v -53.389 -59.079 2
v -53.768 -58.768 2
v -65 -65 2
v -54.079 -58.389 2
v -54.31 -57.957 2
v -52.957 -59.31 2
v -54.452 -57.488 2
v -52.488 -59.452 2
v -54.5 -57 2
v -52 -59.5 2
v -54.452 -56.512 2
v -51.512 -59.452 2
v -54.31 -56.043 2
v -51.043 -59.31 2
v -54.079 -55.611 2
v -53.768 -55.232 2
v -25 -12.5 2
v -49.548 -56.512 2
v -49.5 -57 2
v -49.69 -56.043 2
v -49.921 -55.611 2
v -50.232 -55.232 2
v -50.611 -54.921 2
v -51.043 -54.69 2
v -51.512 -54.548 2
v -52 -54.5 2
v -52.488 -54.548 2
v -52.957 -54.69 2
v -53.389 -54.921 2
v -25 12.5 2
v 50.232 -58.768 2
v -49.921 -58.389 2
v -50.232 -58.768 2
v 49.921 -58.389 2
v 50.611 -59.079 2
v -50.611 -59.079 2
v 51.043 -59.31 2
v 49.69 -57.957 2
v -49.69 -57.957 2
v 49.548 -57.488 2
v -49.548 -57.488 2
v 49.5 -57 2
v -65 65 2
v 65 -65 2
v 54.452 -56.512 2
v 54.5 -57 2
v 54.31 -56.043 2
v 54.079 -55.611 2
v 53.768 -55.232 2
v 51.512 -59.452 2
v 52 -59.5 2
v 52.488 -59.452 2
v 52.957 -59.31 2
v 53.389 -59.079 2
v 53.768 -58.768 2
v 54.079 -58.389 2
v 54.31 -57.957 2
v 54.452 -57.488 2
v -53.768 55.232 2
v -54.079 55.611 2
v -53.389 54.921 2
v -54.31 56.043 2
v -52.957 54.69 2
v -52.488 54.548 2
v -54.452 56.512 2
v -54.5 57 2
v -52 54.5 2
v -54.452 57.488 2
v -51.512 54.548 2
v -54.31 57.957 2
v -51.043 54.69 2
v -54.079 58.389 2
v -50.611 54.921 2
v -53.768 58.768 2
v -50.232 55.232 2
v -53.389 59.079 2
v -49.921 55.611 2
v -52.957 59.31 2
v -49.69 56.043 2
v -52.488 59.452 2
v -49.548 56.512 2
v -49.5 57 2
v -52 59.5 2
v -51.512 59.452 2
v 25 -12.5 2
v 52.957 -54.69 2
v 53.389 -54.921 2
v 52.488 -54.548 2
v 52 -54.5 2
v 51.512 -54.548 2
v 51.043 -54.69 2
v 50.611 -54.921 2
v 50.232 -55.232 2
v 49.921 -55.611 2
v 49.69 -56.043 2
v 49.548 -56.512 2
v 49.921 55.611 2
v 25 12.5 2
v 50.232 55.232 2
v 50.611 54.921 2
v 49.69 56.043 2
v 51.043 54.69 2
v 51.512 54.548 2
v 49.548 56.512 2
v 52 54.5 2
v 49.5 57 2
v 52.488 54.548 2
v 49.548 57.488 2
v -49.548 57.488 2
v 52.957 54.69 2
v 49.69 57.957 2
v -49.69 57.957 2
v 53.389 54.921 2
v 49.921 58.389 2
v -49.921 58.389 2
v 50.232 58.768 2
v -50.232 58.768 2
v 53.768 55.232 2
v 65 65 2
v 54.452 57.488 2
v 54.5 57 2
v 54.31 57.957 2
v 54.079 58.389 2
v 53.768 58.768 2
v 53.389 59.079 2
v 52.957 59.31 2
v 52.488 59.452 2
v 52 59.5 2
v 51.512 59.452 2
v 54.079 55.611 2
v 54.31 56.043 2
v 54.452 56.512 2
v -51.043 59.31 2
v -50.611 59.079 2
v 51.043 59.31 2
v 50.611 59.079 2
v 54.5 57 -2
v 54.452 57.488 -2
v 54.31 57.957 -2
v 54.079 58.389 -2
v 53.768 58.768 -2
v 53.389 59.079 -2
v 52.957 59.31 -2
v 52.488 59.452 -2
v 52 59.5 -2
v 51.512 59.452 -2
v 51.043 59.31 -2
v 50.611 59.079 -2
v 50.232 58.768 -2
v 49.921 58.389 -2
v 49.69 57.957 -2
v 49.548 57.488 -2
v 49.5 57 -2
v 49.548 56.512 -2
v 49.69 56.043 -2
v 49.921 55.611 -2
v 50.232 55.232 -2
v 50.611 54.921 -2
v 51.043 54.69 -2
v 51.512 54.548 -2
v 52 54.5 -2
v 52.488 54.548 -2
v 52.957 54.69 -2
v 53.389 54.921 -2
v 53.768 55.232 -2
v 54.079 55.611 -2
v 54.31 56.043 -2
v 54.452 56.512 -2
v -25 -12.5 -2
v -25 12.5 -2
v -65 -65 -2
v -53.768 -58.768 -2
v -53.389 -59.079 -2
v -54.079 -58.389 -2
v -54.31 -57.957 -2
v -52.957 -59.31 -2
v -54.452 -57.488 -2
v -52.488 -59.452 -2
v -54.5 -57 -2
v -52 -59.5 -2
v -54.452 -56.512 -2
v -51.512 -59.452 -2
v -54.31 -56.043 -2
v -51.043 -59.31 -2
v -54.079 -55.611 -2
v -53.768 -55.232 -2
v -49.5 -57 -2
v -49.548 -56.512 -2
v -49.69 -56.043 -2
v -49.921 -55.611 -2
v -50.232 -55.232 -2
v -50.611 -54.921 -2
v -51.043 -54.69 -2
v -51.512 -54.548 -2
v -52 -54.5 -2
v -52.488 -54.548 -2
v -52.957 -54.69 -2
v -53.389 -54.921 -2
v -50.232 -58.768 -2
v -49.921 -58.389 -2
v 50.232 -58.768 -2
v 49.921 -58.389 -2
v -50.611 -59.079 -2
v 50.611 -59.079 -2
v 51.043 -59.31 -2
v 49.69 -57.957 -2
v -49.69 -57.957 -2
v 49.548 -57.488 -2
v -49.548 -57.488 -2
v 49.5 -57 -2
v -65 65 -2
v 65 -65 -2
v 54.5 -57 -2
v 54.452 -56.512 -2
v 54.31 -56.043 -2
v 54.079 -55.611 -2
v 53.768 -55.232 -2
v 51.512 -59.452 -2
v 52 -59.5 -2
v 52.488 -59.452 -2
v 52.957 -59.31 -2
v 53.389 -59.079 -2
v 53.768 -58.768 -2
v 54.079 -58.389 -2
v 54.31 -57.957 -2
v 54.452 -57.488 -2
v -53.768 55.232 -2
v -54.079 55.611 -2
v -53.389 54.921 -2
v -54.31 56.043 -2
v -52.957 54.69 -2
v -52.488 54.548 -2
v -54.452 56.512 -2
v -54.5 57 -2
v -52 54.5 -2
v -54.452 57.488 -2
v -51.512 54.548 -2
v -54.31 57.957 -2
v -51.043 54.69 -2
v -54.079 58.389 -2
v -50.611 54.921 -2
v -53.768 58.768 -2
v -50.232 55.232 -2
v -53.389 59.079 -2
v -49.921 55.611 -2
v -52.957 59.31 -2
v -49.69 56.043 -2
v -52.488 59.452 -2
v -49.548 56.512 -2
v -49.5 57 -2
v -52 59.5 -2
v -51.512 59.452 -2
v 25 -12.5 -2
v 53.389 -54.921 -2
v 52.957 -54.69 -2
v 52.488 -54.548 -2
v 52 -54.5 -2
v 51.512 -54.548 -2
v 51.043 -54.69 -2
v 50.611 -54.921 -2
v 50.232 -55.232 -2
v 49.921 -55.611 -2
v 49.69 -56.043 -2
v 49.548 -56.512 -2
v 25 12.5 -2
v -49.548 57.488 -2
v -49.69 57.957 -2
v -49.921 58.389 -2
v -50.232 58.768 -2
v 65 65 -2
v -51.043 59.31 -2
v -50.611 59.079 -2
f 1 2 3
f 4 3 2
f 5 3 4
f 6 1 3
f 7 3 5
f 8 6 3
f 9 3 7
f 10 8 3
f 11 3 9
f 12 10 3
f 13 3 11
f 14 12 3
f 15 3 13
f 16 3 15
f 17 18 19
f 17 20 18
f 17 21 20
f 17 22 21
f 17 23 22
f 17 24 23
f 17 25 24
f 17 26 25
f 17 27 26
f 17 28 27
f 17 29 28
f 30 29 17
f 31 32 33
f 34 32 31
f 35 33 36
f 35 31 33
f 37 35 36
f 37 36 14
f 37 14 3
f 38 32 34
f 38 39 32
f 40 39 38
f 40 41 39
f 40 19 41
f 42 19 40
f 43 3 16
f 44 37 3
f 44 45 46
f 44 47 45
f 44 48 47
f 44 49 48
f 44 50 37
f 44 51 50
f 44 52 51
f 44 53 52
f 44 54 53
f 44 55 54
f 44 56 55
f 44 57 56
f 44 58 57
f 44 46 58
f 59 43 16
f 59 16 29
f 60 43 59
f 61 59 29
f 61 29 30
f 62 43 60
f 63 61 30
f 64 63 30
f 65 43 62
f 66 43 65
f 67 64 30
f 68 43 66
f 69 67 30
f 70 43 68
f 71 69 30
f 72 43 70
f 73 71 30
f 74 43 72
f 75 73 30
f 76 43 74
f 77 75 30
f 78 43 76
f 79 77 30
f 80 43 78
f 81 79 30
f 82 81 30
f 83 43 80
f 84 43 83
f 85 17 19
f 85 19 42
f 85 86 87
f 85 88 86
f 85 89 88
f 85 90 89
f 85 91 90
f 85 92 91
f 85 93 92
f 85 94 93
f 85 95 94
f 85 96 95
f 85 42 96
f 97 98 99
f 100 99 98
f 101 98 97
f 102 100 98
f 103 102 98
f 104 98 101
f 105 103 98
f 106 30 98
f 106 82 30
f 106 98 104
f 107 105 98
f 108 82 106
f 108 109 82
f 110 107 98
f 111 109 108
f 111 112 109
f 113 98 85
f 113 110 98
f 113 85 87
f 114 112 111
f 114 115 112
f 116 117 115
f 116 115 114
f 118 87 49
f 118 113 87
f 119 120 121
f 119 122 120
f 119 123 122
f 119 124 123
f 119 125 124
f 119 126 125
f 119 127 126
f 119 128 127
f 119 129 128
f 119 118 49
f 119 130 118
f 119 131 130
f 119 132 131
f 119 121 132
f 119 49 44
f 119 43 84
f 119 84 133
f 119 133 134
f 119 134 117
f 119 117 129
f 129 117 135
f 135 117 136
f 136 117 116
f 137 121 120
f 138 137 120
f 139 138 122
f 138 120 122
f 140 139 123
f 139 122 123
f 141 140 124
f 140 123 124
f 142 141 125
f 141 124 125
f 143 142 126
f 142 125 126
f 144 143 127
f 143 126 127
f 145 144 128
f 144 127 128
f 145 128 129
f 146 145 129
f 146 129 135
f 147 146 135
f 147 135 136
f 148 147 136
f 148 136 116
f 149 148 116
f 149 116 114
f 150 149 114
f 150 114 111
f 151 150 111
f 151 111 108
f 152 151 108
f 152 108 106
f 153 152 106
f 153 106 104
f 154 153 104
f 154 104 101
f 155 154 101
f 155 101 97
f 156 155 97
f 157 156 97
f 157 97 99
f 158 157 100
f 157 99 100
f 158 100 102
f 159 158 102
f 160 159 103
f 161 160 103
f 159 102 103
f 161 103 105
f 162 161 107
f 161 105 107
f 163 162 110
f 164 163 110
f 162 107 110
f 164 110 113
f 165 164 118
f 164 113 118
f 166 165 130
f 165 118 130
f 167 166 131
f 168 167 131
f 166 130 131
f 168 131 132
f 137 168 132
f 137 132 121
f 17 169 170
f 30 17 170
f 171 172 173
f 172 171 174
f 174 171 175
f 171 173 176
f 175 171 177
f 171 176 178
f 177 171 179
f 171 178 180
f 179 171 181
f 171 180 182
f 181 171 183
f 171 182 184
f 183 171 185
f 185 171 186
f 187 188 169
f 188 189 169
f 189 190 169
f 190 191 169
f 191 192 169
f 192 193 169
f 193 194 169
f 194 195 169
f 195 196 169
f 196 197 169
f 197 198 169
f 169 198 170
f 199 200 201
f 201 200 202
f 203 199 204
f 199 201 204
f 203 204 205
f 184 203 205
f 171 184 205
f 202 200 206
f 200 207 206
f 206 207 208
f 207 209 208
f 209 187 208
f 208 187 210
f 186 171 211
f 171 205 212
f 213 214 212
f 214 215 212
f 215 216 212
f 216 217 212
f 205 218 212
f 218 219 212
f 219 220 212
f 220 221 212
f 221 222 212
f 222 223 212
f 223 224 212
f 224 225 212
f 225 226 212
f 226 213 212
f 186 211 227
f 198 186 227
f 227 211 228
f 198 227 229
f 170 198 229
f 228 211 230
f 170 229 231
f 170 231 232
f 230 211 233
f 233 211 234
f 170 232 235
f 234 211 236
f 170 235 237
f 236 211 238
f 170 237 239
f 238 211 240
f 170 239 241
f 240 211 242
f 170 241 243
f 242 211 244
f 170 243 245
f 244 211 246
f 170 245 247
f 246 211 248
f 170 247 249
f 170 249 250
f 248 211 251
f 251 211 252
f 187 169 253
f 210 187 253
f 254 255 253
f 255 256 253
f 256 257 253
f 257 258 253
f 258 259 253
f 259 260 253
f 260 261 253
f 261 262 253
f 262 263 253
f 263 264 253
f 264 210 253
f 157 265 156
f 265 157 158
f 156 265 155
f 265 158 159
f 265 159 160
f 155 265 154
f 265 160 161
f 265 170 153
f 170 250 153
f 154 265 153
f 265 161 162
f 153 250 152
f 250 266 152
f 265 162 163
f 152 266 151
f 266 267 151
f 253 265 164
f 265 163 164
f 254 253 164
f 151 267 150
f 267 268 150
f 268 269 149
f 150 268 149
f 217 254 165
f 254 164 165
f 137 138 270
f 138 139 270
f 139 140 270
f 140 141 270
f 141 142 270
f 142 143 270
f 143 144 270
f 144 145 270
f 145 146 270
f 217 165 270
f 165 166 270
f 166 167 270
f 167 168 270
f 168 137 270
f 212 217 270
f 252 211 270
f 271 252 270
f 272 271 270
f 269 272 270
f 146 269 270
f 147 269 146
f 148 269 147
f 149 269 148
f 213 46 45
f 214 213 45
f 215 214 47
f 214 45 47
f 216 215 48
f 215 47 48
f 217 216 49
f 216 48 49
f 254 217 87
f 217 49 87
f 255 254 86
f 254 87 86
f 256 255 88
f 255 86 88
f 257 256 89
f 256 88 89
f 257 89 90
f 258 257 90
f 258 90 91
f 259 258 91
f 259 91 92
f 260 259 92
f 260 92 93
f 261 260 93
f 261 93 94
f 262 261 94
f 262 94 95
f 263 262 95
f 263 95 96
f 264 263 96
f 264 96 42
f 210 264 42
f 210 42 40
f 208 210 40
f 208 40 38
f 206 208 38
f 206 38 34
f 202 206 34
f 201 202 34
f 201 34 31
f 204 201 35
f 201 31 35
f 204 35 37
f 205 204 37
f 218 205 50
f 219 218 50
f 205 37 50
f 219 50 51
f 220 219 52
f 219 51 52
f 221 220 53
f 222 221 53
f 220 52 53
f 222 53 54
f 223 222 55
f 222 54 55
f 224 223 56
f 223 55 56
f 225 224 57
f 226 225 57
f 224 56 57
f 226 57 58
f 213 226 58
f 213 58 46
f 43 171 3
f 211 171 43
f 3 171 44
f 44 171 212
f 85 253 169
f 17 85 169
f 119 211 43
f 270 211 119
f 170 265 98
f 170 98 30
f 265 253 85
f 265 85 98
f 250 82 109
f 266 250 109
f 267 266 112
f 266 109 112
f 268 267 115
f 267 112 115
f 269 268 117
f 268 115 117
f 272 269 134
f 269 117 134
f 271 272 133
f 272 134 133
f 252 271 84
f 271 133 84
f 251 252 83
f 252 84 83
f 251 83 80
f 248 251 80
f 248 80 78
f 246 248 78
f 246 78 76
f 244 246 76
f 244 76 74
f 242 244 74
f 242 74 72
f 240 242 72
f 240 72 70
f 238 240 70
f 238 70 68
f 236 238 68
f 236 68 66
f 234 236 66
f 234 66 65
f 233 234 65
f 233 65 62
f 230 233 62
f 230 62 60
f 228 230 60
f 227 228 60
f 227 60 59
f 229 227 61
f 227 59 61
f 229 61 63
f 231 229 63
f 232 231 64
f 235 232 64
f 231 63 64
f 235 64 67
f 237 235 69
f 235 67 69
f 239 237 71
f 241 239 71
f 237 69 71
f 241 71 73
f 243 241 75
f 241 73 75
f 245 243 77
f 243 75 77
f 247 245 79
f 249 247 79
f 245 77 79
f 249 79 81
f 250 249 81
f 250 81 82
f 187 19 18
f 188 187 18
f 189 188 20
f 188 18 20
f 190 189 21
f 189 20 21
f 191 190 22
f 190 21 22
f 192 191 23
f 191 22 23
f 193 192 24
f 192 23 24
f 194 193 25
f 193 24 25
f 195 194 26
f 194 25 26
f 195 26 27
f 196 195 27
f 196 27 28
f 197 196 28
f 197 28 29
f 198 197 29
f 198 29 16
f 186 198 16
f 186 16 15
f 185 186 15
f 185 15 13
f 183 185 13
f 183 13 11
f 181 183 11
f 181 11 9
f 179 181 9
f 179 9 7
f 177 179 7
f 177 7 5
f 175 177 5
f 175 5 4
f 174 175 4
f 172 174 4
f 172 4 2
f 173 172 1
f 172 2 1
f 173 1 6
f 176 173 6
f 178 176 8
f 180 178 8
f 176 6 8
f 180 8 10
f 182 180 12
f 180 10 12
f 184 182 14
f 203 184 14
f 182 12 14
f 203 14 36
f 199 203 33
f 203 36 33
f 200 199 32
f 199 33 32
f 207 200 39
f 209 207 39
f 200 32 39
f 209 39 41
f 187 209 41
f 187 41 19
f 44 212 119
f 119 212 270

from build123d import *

# Parameters (mm, degrees)
BOSS_EXTRUDE1_DEPTH         = 2
BOSS_EXTRUDE1_DEPTH_BACK    = 2
SKETCH1_W                   = 130
SKETCH1_H                   = 130
TAP_DRILL_FOR_M5X0_8_TAP1_D = 5
SKETCH5_W                   = 50
SKETCH5_H                   = 25
CUT_EXTRUDE2_DEPTH          = 20


with BuildPart() as part:
    # Sketch1 → Boss-Extrude1 (new, two sides: drawn at the far end of the back side and taken through both)
    with BuildSketch(Plane.XY.offset(-BOSS_EXTRUDE1_DEPTH_BACK)):
        Rectangle(SKETCH1_W, SKETCH1_H)
    extrude(amount=BOSS_EXTRUDE1_DEPTH + BOSS_EXTRUDE1_DEPTH_BACK)

    # Tap Drill for M5x0.8 Tap1 (through all)
    with Locations(Plane(origin=(0, 0, -2), x_dir=(-1, 0, 0), z_dir=(0, 0, -1))):
        with Locations((-52, 57), (52, 57), (52, -57), (-52, -57)):
            Hole(TAP_DRILL_FOR_M5X0_8_TAP1_D / 2)

    # Sketch5 → Cut-Extrude2 (cut)
    with BuildSketch(Plane(origin=(0, 0, -2), x_dir=(-1, 0, 0), z_dir=(0, 0, -1))):
        Rectangle(SKETCH5_W, SKETCH5_H)
    extrude(amount=-CUT_EXTRUDE2_DEPTH, mode=Mode.SUBTRACT)


solid = part.part
